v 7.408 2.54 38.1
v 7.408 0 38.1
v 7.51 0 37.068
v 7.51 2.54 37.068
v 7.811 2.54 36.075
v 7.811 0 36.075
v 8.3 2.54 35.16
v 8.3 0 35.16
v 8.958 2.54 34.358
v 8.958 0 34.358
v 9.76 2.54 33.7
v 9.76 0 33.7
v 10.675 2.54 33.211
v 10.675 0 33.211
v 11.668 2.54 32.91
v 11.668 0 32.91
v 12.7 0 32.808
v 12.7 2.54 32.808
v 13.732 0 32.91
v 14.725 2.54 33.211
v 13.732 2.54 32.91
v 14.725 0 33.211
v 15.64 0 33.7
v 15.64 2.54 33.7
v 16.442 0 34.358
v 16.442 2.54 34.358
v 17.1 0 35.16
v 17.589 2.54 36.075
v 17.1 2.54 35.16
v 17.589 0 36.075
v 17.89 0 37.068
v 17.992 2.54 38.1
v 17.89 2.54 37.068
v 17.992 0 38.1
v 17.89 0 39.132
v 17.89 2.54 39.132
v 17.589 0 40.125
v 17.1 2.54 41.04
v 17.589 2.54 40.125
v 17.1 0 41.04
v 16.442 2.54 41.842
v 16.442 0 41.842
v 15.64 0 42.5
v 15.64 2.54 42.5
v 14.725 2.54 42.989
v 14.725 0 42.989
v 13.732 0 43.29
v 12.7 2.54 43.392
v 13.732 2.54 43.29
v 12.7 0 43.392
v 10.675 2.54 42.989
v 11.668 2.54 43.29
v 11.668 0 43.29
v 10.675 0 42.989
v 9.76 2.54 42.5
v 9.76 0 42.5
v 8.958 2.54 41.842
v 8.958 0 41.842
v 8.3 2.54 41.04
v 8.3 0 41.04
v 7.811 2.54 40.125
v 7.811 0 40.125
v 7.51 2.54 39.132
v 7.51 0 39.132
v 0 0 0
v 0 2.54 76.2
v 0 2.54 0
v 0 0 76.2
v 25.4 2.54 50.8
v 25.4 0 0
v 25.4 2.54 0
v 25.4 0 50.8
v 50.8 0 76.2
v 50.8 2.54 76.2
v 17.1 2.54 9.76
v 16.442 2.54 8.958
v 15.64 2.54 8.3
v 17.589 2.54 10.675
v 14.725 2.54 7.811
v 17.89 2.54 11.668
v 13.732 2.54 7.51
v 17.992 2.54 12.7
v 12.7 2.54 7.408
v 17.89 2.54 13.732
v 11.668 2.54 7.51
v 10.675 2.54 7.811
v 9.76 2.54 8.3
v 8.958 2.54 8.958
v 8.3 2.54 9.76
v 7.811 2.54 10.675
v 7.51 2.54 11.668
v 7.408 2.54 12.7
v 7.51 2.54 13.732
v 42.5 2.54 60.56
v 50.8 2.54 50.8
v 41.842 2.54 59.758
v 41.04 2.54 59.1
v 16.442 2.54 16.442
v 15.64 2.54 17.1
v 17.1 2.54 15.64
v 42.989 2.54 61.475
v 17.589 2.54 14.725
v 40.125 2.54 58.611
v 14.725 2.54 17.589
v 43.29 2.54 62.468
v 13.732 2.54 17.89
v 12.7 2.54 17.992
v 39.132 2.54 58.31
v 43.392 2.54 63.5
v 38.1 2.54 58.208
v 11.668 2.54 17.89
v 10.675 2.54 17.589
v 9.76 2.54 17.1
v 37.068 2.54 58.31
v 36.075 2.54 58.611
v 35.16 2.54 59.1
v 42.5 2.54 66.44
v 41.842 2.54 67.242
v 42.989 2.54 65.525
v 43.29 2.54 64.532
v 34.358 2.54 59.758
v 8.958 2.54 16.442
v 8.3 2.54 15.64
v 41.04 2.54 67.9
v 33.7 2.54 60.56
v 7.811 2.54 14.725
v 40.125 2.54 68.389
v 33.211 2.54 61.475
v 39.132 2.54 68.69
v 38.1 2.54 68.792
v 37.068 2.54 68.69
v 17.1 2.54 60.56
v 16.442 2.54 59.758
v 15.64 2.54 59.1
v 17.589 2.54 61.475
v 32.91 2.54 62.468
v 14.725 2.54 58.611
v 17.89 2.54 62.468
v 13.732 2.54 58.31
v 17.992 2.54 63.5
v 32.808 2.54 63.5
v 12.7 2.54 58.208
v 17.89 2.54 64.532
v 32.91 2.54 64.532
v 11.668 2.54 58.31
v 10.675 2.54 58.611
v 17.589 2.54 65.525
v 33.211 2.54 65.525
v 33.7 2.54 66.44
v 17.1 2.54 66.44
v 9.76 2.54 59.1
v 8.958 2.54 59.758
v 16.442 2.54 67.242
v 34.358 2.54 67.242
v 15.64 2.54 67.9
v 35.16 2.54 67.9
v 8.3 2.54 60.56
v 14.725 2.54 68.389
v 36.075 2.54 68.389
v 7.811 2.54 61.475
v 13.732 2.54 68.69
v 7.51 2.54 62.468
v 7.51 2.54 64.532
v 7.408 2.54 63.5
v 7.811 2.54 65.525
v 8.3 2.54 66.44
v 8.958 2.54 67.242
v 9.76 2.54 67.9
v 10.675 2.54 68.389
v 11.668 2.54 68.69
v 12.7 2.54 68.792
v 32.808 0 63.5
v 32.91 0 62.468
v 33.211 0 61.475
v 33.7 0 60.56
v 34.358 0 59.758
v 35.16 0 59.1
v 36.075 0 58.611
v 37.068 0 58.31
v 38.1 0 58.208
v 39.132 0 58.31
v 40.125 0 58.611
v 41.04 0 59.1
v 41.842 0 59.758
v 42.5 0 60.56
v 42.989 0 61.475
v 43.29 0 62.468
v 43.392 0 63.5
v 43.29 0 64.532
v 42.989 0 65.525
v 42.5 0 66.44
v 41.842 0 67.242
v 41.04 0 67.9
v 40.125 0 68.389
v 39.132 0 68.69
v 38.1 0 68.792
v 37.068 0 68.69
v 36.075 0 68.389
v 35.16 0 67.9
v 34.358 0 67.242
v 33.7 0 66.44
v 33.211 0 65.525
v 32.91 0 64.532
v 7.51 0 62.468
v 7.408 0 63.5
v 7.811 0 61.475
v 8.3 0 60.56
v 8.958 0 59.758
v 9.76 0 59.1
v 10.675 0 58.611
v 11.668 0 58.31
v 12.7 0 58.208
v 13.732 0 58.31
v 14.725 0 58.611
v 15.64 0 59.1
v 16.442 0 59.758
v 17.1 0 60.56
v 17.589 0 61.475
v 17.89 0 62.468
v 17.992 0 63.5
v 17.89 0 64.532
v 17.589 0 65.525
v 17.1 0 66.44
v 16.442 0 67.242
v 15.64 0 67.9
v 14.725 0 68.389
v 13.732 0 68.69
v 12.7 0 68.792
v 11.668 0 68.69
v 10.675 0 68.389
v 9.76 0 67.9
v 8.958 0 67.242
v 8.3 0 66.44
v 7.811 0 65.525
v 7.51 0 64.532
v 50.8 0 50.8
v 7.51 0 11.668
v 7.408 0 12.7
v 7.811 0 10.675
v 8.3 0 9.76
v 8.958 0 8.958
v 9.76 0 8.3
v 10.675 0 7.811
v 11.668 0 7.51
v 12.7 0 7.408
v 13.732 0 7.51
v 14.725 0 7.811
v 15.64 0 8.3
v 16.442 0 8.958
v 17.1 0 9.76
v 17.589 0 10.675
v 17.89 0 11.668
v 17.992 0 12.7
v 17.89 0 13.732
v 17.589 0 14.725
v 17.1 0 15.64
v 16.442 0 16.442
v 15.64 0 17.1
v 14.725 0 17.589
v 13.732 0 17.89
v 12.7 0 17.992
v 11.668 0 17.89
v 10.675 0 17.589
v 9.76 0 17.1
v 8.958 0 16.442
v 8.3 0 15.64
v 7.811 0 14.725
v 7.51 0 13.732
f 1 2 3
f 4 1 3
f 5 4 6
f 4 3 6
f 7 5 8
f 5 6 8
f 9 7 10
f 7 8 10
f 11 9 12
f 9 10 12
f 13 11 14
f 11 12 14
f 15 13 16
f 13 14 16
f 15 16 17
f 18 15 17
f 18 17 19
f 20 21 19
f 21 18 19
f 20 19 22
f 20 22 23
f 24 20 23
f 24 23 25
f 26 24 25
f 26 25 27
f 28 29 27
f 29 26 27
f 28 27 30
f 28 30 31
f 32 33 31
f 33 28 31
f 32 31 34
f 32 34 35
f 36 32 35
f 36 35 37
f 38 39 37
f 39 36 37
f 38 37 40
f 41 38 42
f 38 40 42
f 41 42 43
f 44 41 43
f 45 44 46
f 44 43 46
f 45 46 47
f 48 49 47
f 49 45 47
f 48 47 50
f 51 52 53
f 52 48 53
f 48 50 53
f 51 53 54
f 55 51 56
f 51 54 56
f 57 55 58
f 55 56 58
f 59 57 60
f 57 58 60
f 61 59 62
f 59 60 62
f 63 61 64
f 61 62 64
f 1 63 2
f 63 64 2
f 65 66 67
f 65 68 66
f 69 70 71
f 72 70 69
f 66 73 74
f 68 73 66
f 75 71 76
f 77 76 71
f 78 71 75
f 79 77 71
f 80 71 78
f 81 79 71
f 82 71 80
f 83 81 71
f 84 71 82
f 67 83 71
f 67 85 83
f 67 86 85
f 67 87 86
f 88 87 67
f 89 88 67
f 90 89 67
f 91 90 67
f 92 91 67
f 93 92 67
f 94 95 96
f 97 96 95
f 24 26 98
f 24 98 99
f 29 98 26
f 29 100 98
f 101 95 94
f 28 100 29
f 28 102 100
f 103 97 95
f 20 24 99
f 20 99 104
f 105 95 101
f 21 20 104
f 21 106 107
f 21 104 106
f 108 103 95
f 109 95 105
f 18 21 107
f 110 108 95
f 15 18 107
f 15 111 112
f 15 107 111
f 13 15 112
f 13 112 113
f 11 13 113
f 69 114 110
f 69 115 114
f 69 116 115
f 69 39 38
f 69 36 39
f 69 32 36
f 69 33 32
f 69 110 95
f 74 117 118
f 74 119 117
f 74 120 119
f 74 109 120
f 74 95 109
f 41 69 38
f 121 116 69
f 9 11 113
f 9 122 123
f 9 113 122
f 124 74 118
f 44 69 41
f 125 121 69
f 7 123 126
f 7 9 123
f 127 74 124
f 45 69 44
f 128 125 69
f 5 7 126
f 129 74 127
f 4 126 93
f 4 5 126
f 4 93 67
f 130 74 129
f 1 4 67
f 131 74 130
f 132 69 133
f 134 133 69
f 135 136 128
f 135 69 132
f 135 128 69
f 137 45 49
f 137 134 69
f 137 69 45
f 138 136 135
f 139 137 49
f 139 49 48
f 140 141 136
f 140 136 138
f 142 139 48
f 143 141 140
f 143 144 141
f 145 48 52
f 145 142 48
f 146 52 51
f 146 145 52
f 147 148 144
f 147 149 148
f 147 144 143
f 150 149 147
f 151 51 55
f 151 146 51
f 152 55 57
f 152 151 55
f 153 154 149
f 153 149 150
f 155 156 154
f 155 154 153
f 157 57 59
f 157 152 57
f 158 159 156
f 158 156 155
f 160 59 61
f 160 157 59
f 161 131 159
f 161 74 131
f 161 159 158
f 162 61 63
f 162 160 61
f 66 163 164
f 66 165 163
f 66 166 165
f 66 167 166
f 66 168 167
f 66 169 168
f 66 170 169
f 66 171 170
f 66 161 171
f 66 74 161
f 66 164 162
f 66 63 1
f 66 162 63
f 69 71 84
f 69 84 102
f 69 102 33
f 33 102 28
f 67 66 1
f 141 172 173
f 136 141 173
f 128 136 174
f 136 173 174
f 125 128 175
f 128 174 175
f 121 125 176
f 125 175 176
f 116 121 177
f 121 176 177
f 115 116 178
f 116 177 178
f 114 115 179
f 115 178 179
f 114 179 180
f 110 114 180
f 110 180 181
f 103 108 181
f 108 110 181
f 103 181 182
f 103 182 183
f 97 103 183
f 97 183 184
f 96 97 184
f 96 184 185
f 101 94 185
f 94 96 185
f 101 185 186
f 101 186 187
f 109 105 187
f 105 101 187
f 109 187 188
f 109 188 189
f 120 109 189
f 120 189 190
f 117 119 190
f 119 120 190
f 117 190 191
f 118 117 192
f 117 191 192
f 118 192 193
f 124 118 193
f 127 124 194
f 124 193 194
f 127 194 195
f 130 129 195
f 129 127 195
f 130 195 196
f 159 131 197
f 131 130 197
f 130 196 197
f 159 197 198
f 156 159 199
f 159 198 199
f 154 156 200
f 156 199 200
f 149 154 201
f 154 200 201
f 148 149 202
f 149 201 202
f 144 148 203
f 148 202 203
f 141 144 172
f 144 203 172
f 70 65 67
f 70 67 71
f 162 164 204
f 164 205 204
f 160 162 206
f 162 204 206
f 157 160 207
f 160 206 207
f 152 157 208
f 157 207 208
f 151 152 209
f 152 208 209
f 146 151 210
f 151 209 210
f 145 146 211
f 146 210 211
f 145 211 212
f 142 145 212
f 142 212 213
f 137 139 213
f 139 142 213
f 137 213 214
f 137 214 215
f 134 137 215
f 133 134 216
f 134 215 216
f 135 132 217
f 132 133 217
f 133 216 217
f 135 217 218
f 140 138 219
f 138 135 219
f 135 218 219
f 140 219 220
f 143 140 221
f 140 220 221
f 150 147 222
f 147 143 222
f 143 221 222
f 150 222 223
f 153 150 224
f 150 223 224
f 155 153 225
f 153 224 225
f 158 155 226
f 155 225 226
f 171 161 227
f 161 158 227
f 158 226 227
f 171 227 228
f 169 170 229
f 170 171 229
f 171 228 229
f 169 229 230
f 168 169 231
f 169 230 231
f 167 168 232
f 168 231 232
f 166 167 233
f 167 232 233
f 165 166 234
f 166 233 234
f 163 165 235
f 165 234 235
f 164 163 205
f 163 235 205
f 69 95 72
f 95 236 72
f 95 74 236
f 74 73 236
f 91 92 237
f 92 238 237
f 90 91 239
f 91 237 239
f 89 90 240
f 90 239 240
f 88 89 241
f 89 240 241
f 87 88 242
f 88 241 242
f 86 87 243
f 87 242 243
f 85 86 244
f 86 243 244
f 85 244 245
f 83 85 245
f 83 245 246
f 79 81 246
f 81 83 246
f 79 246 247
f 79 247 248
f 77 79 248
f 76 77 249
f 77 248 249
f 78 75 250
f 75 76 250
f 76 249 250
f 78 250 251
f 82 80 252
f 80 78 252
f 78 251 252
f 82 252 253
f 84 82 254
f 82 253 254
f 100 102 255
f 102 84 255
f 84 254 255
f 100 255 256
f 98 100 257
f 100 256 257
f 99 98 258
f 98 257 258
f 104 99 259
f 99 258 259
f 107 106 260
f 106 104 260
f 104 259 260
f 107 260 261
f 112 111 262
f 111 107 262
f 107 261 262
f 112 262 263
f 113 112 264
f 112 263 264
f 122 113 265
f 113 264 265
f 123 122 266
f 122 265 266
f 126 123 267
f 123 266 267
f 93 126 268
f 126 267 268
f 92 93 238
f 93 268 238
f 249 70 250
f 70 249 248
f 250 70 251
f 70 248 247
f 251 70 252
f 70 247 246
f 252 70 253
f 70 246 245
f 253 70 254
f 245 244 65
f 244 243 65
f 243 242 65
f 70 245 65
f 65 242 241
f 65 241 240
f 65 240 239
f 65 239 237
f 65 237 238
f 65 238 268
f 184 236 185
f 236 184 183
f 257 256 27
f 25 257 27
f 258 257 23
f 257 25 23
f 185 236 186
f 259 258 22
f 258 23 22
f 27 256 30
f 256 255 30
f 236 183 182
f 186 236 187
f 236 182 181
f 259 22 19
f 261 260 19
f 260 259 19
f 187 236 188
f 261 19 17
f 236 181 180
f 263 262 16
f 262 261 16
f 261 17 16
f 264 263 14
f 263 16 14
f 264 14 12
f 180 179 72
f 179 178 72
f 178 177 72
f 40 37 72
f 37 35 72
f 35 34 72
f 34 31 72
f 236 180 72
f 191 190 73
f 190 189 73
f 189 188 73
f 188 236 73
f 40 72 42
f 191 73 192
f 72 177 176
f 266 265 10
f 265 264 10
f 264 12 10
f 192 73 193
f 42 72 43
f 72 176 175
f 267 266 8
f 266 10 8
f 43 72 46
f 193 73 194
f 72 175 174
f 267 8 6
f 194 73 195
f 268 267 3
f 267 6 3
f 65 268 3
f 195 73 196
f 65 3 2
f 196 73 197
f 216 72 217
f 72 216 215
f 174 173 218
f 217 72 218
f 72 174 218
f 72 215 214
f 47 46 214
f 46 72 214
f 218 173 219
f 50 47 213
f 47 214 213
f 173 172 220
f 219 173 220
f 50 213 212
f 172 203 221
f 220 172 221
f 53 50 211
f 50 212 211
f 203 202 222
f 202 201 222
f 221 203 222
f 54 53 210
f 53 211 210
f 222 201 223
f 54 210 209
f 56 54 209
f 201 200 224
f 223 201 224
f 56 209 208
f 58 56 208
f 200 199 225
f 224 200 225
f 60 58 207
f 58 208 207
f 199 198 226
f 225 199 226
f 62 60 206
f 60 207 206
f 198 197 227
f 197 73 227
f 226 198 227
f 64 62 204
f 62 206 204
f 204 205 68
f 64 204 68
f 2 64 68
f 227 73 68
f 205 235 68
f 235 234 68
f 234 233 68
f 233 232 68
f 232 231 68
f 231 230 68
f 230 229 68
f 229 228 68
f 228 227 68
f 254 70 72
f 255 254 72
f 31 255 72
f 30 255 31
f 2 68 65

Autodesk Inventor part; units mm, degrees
ref_plane "YZ Plane" through (0, 0, 0) normal (1, 0, 0) x (0, 1, 0)
ref_plane "XZ Plane" through (0, 0, 0) normal (0, 1, 0) x (-1, 0, 0)
ref_plane "XY Plane" through (0, 0, 0) normal (0, 0, 1) x (1, 0, 0)
sketch "Sketch1" plane through (0, 0, 0) normal (0, 1, 0) x (-1, 0, 0)
  line L0 (0, 0) -> (-25.4, 0)
  line L1 (-25.4, 0) -> (-25.4, 76.2)
  line L2 (-25.4, 76.2) -> (0, 76.2)
  line L3 (0, 76.2) -> (0, 0)
  line L4 (-25.4, 76.2) -> (-50.8, 76.2)
  line L5 (-50.8, 76.2) -> (-50.8, 50.8)
  line L6 (-50.8, 50.8) -> (-25.4, 50.8)
  line L7 (-25.4, 50.8) -> (-25.4, 76.2)
  circle A0 centre (-12.7, 12.7) radius 5.2917
  circle A1 centre (-38.1, 63.5) radius 5.2917
  circle A2 centre (-12.7, 38.1) radius 5.2917
  circle A3 centre (-12.7, 63.5) radius 5.2917
  dimension "d0" = 76.2
  dimension "d1" = 25.4
  dimension "d2" = 25.4
  dimension "d3" = 25.4
  dimension "d5" = 38.1
  dimension "d7" = 25.4
  dimension "d8" = 25.4
  dimension "d11" = 12.7
  dimension "d12" = 12.7
  dimension "d13" = 12.7
  dimension "d14" = 10.5833
  dimension "d15" = 10.5833
  dimension "d16" = 10.5833
  dimension "d17" = 10.5833
  dimension "d18" = 12.7
  dimension "d19" = 25.4
  dimension "d20" = 12.7
extrude "Extrusion1" add sketch "Sketch1" along normal blind 2.54
equation "\"d15\" = d14"
equation "\"d16\" = d14"
equation "\"d17\" = d14"
properties part number "bracing 2x3"
